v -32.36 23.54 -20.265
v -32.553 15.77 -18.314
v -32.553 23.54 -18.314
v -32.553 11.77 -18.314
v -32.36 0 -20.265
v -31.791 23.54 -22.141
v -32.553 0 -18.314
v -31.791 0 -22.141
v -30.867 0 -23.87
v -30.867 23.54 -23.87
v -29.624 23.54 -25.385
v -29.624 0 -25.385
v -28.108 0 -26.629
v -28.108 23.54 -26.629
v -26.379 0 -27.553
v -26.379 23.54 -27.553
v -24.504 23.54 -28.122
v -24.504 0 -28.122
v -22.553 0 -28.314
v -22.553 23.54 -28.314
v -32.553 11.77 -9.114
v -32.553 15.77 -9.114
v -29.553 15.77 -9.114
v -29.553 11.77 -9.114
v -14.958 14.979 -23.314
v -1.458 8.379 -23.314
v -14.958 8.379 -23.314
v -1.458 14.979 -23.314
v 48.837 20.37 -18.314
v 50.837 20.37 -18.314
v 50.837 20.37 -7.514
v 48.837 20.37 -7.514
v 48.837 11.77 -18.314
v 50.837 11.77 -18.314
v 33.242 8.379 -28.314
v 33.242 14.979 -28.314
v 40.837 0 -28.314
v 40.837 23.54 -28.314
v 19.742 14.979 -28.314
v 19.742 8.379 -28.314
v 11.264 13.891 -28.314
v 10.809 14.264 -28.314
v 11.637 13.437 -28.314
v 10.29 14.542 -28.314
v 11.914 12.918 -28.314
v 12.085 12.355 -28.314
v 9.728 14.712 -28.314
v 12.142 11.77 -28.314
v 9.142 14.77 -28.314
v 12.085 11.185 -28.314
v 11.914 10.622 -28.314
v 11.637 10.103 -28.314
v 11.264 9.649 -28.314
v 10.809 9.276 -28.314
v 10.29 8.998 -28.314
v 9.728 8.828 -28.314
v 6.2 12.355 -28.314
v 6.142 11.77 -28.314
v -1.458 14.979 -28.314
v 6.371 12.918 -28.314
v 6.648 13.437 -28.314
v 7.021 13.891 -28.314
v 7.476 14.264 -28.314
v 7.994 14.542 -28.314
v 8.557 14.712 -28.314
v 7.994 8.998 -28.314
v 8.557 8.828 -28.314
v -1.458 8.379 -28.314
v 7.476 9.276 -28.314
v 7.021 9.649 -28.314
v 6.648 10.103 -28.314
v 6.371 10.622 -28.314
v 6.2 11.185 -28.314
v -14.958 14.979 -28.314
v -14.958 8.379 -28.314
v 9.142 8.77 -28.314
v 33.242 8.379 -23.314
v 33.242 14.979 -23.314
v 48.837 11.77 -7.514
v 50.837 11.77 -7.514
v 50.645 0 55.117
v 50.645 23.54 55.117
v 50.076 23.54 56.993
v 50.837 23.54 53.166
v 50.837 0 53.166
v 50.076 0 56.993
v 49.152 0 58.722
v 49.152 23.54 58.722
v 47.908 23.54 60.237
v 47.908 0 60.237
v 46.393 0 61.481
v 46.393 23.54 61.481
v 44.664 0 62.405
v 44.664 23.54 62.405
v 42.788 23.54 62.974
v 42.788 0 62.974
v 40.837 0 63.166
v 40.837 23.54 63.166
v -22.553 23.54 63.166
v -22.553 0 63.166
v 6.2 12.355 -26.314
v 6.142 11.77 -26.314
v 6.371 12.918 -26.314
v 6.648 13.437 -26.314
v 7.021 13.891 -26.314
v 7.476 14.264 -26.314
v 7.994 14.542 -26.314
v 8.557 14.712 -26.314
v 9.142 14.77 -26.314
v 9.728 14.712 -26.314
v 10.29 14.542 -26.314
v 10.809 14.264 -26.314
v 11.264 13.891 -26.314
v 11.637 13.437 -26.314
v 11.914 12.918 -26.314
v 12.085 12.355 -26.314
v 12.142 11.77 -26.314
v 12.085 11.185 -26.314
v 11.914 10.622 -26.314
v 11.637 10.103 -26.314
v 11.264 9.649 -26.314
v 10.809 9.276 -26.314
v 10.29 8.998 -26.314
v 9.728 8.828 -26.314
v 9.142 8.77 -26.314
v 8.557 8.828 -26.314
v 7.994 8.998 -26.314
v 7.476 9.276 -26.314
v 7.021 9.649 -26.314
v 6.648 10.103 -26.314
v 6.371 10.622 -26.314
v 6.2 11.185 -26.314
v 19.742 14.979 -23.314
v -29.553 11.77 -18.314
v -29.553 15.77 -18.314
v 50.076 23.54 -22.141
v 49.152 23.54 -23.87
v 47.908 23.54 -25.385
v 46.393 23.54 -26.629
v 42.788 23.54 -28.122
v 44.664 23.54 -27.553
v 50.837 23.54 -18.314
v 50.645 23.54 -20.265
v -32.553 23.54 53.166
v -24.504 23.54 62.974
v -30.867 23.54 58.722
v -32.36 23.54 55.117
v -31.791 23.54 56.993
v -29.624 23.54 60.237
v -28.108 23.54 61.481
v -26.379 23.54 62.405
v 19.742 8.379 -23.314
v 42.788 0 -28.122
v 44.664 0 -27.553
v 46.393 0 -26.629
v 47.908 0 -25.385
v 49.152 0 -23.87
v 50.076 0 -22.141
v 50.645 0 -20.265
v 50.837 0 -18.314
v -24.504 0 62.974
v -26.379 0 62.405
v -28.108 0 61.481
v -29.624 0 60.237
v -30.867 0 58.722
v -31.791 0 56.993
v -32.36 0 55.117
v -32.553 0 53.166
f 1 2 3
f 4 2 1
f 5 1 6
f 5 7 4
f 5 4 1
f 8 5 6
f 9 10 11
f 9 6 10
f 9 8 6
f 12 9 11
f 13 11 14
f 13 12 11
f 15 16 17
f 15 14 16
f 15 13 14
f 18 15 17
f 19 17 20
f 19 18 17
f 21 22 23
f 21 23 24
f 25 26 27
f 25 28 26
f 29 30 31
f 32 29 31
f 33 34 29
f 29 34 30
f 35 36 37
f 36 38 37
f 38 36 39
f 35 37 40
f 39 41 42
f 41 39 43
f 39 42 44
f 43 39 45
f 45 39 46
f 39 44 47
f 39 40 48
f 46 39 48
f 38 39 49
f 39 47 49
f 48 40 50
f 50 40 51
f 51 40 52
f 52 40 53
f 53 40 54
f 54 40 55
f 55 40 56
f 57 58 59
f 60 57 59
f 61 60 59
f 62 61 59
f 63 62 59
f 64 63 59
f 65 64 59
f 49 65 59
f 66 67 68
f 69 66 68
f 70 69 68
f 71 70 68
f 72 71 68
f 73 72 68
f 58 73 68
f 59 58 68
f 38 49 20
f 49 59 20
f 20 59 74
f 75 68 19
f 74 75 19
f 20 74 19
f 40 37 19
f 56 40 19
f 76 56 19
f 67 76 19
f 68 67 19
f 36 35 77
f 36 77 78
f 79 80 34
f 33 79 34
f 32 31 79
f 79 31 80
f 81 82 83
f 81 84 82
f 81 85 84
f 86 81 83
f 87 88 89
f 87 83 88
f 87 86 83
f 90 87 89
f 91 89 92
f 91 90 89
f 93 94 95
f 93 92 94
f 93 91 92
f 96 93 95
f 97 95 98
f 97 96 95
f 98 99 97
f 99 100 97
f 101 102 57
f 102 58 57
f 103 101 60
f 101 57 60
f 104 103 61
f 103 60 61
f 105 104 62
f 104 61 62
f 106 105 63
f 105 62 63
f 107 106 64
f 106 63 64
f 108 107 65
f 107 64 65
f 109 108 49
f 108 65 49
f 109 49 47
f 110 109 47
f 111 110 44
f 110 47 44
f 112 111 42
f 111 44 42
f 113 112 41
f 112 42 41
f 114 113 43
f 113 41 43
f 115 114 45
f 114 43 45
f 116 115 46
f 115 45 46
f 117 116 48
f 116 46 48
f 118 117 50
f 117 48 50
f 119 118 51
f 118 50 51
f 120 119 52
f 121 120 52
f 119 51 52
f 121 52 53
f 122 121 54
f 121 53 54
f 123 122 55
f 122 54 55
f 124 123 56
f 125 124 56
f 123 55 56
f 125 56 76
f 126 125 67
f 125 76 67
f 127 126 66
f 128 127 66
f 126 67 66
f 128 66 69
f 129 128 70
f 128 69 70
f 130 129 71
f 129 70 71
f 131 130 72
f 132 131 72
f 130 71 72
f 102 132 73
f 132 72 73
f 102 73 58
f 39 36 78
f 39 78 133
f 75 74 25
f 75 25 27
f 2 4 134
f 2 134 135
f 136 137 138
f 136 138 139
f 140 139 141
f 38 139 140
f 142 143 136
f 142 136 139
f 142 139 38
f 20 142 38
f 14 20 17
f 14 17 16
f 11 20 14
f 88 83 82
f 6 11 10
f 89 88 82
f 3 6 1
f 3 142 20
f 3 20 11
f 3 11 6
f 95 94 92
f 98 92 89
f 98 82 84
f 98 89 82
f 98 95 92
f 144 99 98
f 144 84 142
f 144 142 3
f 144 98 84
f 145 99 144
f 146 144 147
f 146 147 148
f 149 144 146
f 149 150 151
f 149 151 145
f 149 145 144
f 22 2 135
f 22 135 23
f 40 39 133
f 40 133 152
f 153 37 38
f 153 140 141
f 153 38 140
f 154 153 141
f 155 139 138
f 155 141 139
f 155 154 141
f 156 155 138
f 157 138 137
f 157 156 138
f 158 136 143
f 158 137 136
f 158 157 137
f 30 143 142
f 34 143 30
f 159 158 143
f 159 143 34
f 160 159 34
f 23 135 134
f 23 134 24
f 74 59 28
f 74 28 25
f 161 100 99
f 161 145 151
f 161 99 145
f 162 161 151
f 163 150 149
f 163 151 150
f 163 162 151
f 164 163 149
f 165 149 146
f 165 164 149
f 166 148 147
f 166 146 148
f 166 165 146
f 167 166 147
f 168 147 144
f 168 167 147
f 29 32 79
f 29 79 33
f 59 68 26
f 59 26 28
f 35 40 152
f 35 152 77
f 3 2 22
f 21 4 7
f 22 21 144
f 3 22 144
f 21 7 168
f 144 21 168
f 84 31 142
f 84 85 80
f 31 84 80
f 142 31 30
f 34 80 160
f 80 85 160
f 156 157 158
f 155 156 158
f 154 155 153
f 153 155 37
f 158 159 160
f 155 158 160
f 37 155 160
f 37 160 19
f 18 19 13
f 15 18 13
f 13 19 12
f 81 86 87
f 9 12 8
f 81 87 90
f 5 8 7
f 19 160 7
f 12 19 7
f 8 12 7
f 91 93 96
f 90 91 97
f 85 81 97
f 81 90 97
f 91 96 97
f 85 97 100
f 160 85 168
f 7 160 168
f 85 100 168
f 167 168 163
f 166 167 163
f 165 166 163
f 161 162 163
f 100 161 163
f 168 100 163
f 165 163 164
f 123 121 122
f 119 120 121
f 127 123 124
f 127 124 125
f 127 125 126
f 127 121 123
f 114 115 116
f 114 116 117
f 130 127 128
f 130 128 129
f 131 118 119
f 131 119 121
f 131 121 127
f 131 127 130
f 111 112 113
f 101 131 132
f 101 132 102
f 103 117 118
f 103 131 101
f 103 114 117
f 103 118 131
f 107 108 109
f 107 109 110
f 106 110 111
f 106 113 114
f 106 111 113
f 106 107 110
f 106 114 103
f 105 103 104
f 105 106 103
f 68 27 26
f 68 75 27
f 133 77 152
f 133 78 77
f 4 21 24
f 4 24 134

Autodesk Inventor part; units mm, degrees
ref_plane "YZ Plane" through (0, 0, 0) normal (1, 0, 0) x (0, 1, 0)
ref_plane "XZ Plane" through (0, 0, 0) normal (0, 1, 0) x (-1, 0, 0)
ref_plane "XY Plane" through (0, 0, 0) normal (0, 0, 1) x (1, 0, 0)
sketch "Sketch1" plane through (0, 0, 0) normal (0, 1, 0) x (-1, 0, 0)
  line L0 (22.5526, 63.1659) -> (-40.8374, 63.1659)
  line L1 (-50.8374, 53.1659) -> (-50.8374, -18.3141)
  line L2 (-40.8374, -28.3141) -> (22.5526, -28.3141)
  line L3 (32.5526, -18.3141) -> (32.5526, 53.1659)
  arc A0 (32.5526, 53.1659) -> (22.5526, 63.1659) centre (22.5526, 53.1659) ccw
  arc A1 (22.5526, -28.3141) -> (32.5526, -18.3141) centre (22.5526, -18.3141) ccw
  arc A2 (-50.8374, -18.3141) -> (-40.8374, -28.3141) centre (-40.8374, -18.3141) ccw
  arc A3 (-40.8374, 63.1659) -> (-50.8374, 53.1659) centre (-40.8374, 53.1659) ccw
  point P0 (0, 0)
  point P1 (32.5526, 63.1659)
  point P2 (-50.8374, 63.1659)
  point P3 (32.5526, -28.3141)
  dimension "d0" = 83.39
  dimension "d1" = 91.48
  dimension "d2" = 10
  dimension "d3" = 10
extrude "Extrusion1" add sketch "Sketch1" along normal blind 23.54
sketch "Sketch2" plane through (40.8374, 0, -28.3141) normal (0, 0, -1) x (-1, 0, 0)
  line L0 (7.595, 14.9788) -> (21.095, 14.9788)
  line L1 (21.095, 14.9788) -> (21.095, 8.3788)
  line L2 (21.095, 8.3788) -> (7.595, 8.3788)
  line L3 (7.595, 8.3788) -> (7.595, 14.9788)
  line L4 (42.295, 14.9788) -> (55.795, 14.9788)
  line L5 (55.795, 14.9788) -> (55.795, 8.3788)
  line L6 (55.795, 8.3788) -> (42.295, 8.3788)
  line L7 (42.295, 8.3788) -> (42.295, 14.9788)
  line L8 (73.39, 0) -> (73.39, 23.54) projected
  point P0 (40.8374, 0)
  dimension "d6" = 13.5
  dimension "d7" = 6.6
  dimension "d8" = 13.5
  dimension "d9" = 6.6
  dimension "d10" = 21.2
  dimension "d11" = 17.595
extrude "Extrusion2" cut sketch "Sketch2" against normal blind 5
sketch "Sketch3" plane through (40.8374, 0, -28.3141) normal (0, 0, -1) x (-1, 0, 0)
  circle A0 centre (31.695, 11.77) radius 3
  line L0 (0, 23.54) -> (63.39, 23.54) projected
  line L1 (-10, 0) -> (-10, 23.54) projected
  point P0 (40.8374, 0)
  dimension "d14" = 6
  dimension "d15" = 11.77
  dimension "d16" = 41.695
extrude "Extrusion3" cut sketch "Sketch3" against normal blind 2
sketch "Sketch4" plane through (-32.5526, 0, -18.3141) normal (-1, 0, 0) x (0, 0, 1)
  line L0 (0, 15.77) -> (9.2, 15.77)
  line L1 (9.2, 15.77) -> (9.2, 11.77)
  line L2 (9.2, 11.77) -> (0, 11.77)
  line L3 (0, 11.77) -> (0, 15.77)
  line L4 (0, 0) -> (0, 23.54) projected
  line L5 (71.48, 0) -> (0, 0) projected
  point P0 (18.3141, 0)
  dimension "d19" = 9.2
  dimension "d20" = 4
  dimension "d21" = 0
  dimension "d22" = 11.77
extrude "Extrusion4" cut sketch "Sketch4" against normal blind 3
sketch "Sketch5" plane through (50.8374, 0, 53.1659) normal (1, 0, 0) x (0, 0, -1)
  line L0 (71.48, 15.77) -> (71.48, 23.54) projected
  line L1 (71.48, 20.37) -> (60.68, 20.37)
  line L2 (60.68, 20.37) -> (60.68, 11.77)
  line L3 (60.68, 11.77) -> (71.48, 11.77)
  line L4 (71.48, 11.77) -> (71.48, 20.37)
  line L5 (71.48, 0) -> (0, 0) projected
  point P0 (53.1659, 0)
  dimension "d25" = 8.6
  dimension "d26" = 10.8
  dimension "d27" = 11.77
extrude "Extrusion5" cut sketch "Sketch5" against normal blind 2
equation "\"d8\" = d6"
equation "\"d9\" = d7"
equation "\"d11\" = -d6 + 0.5 * d0 - 0.5 * d10"
equation "\"d16\" = 0.5 * d0"
properties part number "Yoobao"
